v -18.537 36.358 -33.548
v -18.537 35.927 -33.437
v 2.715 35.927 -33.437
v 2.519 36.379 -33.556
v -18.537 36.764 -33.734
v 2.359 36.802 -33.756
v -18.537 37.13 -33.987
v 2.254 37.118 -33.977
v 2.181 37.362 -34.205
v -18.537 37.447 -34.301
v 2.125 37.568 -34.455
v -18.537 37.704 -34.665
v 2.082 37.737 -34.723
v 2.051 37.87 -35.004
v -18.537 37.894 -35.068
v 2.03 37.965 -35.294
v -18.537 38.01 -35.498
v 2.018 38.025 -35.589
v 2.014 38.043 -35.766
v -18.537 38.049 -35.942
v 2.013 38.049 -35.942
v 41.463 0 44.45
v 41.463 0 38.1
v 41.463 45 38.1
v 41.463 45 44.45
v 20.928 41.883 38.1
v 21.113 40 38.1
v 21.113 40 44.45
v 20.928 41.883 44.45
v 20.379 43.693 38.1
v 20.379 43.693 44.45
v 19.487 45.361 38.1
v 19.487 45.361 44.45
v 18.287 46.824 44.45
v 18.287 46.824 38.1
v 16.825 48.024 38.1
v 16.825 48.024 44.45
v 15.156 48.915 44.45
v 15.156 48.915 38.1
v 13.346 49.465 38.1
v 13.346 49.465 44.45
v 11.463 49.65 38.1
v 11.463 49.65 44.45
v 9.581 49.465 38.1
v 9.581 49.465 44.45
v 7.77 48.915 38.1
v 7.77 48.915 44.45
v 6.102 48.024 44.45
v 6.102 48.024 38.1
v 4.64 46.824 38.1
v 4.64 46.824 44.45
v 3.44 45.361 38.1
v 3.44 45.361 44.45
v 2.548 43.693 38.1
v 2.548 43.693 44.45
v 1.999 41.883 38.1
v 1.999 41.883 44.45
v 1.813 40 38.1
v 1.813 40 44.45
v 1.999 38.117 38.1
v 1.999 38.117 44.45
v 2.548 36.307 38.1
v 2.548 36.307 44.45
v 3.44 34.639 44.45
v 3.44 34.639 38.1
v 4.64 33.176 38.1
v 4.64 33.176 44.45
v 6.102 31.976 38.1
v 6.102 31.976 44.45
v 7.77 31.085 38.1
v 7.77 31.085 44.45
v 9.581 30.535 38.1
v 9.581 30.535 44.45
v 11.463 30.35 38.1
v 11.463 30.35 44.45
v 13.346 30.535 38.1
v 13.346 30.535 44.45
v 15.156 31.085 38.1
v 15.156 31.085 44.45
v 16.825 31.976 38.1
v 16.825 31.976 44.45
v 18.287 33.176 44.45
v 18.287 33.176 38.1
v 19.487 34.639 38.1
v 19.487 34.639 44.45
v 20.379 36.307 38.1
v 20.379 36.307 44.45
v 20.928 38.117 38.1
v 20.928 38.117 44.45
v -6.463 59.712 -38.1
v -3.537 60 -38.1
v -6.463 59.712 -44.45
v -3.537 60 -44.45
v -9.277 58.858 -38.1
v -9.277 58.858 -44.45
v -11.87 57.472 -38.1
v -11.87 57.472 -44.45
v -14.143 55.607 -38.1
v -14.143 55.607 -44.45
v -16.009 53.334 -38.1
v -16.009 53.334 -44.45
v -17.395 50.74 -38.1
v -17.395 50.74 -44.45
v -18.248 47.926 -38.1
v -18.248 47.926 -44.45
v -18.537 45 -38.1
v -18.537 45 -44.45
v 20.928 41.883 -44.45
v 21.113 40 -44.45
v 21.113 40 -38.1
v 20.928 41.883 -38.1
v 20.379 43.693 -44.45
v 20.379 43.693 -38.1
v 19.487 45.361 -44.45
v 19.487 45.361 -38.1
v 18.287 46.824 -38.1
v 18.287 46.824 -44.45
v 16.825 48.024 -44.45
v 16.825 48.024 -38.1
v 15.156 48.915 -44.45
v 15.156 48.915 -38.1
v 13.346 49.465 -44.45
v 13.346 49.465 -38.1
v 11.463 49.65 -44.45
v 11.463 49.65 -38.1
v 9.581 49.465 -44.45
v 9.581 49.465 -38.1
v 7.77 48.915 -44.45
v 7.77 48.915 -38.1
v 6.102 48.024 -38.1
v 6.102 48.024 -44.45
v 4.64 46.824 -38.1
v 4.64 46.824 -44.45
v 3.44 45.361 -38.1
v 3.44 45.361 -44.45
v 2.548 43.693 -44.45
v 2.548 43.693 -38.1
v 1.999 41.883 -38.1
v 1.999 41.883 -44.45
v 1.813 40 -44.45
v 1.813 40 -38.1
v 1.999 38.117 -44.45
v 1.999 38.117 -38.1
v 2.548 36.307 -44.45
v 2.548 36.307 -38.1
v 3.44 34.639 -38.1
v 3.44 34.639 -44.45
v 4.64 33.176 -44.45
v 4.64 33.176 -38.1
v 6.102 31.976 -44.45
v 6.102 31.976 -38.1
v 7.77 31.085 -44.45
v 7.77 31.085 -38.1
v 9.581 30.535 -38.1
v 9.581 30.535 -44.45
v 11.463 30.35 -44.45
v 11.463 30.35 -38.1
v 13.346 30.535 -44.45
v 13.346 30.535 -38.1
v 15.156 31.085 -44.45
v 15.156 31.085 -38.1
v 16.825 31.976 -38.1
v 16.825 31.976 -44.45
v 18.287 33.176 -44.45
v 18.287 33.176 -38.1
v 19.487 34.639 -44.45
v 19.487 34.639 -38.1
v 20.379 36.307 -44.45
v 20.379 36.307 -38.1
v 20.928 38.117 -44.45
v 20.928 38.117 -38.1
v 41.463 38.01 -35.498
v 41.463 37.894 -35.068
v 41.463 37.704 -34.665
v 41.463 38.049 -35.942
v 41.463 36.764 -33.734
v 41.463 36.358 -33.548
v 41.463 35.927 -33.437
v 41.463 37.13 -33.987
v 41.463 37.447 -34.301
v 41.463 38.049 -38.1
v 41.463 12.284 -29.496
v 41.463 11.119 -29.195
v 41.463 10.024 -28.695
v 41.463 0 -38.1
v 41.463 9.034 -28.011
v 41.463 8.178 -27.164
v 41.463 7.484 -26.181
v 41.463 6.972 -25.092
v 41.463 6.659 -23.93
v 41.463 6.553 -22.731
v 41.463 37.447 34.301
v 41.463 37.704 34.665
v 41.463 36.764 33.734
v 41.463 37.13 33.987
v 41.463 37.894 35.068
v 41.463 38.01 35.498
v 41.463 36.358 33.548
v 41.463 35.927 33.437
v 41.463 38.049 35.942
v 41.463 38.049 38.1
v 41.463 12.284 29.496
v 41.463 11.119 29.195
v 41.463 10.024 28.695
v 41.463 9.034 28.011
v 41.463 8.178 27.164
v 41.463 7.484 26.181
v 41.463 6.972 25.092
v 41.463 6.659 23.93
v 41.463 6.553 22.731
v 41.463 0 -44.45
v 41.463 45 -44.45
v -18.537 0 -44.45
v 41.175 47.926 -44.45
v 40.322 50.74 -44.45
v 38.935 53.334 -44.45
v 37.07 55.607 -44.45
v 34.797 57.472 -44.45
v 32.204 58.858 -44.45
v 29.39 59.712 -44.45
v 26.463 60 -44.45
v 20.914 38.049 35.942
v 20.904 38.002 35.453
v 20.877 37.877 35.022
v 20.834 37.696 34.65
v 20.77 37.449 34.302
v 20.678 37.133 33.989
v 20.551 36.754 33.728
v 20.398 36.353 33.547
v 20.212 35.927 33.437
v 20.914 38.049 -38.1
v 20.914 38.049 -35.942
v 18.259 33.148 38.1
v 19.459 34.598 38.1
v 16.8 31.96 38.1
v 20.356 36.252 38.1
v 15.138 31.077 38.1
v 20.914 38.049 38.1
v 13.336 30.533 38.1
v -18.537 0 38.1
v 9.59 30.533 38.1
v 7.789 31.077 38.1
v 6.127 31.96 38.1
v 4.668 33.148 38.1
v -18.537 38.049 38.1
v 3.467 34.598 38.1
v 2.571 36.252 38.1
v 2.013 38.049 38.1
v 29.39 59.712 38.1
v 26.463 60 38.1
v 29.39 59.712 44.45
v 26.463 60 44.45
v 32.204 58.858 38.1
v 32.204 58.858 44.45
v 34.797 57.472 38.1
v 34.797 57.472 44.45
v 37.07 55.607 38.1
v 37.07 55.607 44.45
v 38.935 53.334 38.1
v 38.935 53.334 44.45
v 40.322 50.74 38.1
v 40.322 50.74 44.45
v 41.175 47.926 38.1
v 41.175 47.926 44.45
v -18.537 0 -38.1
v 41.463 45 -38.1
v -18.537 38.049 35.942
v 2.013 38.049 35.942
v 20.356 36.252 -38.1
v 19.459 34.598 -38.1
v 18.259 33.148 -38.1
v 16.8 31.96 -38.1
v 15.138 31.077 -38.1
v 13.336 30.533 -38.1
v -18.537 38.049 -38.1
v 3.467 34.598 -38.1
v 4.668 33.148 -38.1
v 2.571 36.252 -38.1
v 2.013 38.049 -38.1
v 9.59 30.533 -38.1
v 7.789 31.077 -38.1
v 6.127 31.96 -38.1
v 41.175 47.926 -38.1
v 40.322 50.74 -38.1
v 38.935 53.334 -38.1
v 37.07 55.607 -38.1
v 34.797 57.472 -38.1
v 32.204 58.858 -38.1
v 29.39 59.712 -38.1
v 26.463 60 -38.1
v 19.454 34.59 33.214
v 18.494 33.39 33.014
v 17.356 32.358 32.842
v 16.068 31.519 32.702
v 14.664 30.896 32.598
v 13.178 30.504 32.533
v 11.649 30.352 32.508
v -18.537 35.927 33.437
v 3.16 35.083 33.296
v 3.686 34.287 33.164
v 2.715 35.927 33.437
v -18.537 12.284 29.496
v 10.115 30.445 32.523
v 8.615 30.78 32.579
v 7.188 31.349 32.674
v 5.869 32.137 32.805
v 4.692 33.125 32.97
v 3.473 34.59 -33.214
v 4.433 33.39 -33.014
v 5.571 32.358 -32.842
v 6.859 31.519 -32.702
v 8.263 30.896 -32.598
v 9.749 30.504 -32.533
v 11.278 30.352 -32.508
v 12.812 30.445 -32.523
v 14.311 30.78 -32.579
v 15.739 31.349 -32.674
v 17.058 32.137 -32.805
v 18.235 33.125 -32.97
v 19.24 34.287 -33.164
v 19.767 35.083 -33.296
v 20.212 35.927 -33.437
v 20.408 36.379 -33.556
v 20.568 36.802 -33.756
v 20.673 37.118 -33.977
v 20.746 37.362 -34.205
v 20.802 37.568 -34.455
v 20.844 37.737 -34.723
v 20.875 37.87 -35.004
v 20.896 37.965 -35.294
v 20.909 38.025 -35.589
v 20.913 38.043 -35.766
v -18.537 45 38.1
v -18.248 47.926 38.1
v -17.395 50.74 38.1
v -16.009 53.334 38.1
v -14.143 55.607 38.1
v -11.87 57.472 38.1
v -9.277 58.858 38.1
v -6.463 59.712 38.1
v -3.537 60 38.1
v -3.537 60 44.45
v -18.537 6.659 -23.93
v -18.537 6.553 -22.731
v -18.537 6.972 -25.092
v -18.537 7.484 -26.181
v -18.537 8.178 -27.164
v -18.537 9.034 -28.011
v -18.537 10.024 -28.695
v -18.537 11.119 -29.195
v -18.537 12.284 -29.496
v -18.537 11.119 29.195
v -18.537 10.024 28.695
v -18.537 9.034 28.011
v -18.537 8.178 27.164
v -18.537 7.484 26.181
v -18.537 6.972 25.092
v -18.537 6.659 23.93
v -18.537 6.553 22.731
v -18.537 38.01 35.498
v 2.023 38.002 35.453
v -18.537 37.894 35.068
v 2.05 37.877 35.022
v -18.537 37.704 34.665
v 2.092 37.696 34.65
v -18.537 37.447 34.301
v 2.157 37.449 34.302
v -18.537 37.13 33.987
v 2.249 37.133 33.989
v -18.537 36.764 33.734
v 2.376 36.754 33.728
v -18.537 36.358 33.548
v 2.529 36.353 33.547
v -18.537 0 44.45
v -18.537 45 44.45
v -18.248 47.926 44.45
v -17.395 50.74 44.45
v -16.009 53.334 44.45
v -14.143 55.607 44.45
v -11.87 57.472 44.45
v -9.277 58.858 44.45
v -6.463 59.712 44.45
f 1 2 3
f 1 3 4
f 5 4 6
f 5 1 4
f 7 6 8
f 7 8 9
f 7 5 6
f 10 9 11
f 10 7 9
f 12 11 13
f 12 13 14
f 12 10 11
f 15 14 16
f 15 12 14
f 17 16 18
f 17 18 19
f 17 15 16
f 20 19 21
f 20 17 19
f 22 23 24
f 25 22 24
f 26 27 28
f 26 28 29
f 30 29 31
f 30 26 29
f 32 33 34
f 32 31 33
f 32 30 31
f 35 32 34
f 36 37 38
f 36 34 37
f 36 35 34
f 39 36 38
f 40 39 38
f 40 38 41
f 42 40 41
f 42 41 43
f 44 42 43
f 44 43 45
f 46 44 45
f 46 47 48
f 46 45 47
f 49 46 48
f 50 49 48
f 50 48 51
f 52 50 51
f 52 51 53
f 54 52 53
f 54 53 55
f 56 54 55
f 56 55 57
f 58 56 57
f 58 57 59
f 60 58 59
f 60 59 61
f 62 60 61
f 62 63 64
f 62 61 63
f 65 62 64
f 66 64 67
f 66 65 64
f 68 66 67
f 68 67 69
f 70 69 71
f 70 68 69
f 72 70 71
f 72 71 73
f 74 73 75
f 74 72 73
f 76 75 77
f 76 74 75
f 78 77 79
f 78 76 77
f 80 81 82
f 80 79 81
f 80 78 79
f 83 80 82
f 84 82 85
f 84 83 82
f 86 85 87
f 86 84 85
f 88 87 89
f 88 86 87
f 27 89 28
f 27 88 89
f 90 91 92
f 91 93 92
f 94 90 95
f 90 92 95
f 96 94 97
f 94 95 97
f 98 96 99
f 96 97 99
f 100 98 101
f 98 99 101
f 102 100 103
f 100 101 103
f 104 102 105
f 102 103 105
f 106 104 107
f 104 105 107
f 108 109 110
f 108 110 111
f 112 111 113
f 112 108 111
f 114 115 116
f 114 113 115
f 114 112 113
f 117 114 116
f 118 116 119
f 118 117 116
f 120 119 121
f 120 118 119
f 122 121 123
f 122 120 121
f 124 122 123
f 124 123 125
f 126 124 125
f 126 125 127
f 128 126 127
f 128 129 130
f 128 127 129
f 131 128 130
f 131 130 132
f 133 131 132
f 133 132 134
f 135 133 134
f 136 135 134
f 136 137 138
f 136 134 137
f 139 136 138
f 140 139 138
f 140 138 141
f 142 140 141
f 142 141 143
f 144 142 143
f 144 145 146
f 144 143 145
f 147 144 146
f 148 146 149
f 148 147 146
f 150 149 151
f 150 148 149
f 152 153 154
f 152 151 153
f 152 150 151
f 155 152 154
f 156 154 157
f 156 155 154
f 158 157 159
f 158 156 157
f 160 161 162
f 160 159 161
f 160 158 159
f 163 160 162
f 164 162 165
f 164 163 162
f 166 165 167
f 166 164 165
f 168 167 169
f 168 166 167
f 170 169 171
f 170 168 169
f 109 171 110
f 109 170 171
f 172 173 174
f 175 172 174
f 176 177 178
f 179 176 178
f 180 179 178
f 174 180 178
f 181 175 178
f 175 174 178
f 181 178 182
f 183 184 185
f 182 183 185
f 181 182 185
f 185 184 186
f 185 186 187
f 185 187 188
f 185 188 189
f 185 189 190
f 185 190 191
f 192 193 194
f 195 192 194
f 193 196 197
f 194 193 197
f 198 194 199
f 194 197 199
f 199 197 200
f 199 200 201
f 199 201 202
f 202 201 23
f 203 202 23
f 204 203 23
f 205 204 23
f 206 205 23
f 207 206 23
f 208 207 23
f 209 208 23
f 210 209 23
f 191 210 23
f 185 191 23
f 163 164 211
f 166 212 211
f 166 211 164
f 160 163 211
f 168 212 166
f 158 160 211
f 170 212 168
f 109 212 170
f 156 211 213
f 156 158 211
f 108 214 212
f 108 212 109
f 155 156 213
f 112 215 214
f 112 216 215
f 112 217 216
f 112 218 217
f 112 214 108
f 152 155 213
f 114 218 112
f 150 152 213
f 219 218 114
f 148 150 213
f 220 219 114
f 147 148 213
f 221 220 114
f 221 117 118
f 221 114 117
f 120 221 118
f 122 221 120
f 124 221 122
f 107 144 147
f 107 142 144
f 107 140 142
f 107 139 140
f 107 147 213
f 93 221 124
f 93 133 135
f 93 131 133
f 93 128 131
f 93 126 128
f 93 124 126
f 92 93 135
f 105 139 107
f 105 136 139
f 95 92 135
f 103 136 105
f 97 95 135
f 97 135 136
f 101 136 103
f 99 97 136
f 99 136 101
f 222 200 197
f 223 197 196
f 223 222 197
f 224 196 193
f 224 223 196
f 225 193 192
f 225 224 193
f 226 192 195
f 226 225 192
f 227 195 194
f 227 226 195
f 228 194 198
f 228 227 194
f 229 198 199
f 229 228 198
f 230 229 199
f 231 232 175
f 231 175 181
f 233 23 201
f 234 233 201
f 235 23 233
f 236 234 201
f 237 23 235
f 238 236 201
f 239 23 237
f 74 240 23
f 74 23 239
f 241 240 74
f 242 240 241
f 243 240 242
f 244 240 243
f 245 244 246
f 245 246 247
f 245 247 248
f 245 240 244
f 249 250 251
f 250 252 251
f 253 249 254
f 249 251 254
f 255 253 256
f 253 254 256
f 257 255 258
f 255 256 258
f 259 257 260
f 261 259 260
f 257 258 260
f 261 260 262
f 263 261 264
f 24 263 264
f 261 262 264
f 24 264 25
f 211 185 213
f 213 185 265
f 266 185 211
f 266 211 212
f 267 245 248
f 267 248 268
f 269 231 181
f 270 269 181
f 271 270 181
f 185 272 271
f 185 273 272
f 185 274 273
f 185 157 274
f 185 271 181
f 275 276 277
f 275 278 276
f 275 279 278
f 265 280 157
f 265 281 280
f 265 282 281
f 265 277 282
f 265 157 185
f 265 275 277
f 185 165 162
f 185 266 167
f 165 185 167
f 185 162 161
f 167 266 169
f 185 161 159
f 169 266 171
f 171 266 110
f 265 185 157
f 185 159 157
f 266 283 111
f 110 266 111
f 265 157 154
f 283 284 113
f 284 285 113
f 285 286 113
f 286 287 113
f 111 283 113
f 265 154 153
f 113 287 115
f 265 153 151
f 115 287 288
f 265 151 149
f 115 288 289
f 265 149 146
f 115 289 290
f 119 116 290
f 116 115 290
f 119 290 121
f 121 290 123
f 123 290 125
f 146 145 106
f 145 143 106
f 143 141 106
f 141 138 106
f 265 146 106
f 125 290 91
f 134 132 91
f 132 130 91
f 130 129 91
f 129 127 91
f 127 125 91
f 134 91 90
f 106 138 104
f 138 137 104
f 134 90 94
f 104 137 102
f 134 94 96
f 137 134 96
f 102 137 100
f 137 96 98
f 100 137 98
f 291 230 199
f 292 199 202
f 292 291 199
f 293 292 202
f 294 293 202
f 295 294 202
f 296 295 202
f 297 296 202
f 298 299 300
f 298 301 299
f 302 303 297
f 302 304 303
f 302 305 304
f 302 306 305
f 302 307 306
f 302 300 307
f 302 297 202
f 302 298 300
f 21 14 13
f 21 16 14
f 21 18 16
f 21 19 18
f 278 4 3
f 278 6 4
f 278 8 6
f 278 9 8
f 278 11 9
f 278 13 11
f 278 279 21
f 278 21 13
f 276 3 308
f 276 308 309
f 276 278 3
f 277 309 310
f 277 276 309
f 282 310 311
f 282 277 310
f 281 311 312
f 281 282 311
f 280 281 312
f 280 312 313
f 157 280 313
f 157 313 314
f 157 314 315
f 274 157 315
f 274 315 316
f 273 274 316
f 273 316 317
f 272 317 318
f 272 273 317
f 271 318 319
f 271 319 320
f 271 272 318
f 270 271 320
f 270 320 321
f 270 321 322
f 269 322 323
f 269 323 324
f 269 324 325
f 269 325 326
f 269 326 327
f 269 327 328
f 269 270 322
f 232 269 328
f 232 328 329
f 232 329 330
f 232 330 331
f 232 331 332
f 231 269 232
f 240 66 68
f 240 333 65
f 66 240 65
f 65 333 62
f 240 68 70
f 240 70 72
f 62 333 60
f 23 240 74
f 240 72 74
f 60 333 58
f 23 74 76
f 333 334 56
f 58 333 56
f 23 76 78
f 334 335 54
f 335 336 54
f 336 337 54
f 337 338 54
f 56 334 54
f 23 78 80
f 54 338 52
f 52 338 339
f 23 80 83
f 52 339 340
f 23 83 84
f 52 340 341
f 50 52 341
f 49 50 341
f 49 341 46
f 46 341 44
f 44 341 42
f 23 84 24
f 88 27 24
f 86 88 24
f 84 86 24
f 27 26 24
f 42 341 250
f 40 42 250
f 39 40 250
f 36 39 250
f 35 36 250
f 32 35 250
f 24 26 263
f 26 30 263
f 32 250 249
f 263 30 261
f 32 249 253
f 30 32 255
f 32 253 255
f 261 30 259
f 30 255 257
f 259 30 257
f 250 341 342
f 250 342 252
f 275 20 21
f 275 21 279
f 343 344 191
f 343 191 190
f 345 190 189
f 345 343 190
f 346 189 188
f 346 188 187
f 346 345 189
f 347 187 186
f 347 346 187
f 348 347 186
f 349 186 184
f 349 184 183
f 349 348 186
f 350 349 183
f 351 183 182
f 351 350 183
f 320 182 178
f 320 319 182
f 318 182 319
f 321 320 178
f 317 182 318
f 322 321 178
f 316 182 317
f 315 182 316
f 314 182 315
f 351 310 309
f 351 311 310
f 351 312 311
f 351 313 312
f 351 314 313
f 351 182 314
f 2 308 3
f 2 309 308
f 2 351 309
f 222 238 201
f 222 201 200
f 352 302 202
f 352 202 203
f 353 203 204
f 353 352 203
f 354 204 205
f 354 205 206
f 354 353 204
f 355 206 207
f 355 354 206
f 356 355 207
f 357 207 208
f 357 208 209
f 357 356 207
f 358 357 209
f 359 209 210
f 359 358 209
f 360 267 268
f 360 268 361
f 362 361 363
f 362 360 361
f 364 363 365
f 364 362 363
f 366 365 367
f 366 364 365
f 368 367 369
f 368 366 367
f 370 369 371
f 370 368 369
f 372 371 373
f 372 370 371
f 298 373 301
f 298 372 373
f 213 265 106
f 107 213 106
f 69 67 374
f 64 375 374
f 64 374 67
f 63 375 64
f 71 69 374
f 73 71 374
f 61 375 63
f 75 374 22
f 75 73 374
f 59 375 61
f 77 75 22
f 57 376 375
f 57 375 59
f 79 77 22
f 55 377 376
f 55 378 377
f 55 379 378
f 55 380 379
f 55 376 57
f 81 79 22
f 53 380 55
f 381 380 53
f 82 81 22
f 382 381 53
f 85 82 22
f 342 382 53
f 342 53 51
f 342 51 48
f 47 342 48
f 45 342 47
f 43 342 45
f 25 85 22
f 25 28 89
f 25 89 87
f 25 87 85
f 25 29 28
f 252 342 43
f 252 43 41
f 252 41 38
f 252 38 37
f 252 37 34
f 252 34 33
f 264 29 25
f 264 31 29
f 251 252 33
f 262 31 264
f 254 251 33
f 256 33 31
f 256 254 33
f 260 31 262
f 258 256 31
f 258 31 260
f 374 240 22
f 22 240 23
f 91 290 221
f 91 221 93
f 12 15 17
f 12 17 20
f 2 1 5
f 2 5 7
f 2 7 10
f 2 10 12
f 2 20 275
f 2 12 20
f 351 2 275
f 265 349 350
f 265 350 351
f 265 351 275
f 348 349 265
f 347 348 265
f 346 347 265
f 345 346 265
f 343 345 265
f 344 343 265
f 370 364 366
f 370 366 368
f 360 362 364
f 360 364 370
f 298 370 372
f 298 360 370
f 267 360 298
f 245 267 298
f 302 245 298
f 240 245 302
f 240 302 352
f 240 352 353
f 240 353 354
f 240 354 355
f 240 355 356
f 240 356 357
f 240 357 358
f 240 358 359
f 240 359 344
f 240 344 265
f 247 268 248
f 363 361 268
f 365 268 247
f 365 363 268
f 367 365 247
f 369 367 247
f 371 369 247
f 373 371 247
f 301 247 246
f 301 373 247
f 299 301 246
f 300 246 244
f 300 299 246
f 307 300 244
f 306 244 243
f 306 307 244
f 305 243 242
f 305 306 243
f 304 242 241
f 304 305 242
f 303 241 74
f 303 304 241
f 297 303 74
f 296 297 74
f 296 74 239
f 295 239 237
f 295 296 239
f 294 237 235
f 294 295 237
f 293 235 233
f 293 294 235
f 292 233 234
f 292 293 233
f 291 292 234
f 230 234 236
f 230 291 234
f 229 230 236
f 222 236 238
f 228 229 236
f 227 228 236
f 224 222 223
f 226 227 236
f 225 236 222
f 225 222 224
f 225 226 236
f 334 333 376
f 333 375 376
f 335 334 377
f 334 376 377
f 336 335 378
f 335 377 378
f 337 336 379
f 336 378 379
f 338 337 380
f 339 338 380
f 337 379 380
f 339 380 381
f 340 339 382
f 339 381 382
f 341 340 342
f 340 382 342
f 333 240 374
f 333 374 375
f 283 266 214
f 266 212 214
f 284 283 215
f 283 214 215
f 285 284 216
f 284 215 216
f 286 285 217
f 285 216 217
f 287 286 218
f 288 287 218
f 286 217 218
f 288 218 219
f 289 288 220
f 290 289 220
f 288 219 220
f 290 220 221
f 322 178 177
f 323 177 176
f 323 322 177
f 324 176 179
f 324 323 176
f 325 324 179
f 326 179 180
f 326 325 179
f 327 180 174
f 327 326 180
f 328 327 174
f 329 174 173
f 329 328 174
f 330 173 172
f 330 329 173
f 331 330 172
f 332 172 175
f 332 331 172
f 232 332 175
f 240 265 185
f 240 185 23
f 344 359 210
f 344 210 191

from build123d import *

# Parameters (mm, degrees)
MIEMBRO_ESTRUCTURAL1_DEPTH = 60
CROQUIS20_W                = 60
CROQUIS20_H                = 60
BRIDA_BASE2_DEPTH          = 6.35
CROQUIS19_W                = 60
CROQUIS19_H                = 60
BRIDA_BASE3_DEPTH          = 6.35
CORTAR_EXTRUIR1_DEPTH      = 111.153127737
CORTAR_EXTRUIR1_DEPTH_BACK = 111.153127737
CROQUIS4_R                 = 9.65
REDONDEO1_R                = 15
REDONDEO2_R                = 15


# Sheet-metal steps are written as plain solids
with BuildPart() as part:
    # Sketch1 → Miembro estructural1 (new body)
    with BuildSketch(Plane.YZ.offset(-18.536654135)):
        with BuildLine():
            Line((0, -38.1), (0, 38.1))
            Line((0, 38.1), (38.0492, 38.1))
            Line((38.0492, 38.1), (38.0492, 35.942335136))
            ThreePointArc((38.0492, 35.942335136), (37.447280466, 34.300554363), (35.926803066, 33.436899509))
            Line((35.926803066, 33.436899509), (12.283671721, 29.496090157))
            ThreePointArc((12.283671721, 29.496090157), (8.178382741, 27.164222052), (6.5532, 22.731413966))
            Line((6.5532, 22.731413966), (6.5532, -22.731413966))
            ThreePointArc((6.5532, -22.731413966), (8.178382741, -27.164222052), (12.283671721, -29.496090157))
            Line((12.283671721, -29.496090157), (35.926803066, -33.436899509))
            ThreePointArc((35.926803066, -33.436899509), (37.447280466, -34.300554363), (38.0492, -35.942335136))
            Line((38.0492, -35.942335136), (38.0492, -38.1))
            Line((38.0492, -38.1), (0, -38.1))
        make_face()
    extrude(amount=MIEMBRO_ESTRUCTURAL1_DEPTH)


with BuildPart() as body_2:
    # Croquis20 → Brida base2 (new body)
    with BuildSketch(Plane(origin=(0, 0, -38.1), x_dir=(-1, 0, 0), z_dir=(0, 0, -1))):
        with Locations((-11.463345865, 30)):
            Rectangle(CROQUIS20_W, CROQUIS20_H)
    extrude(amount=BRIDA_BASE2_DEPTH)


with BuildPart() as body_3:
    # Croquis19 → Brida base3 (new body)
    with BuildSketch(Plane.XY.offset(38.1)):
        with Locations((11.463345865, 30)):
            Rectangle(CROQUIS19_W, CROQUIS19_H)
    extrude(amount=BRIDA_BASE3_DEPTH)


with BuildPart() as cortar_extruir1_tool:
    # Croquis4 → Cortar-Extruir1 (new, two sides: drawn at the far end of the back side and taken through both)
    with BuildSketch(Plane.XY.offset(38.1).offset(-CORTAR_EXTRUIR1_DEPTH_BACK)):
        with Locations((11.463345865, 40)):
            Circle(CROQUIS4_R)
    extrude(amount=CORTAR_EXTRUIR1_DEPTH + CORTAR_EXTRUIR1_DEPTH_BACK)


with BuildPart() as part_1:
    add(part.part)

    # Cortar-Extruir1: cut by cortar_extruir1_tool
    add(cortar_extruir1_tool.part, mode=Mode.SUBTRACT)


with BuildPart() as body_2_1:
    add(body_2.part)

    # Cortar-Extruir1: cut by cortar_extruir1_tool
    add(cortar_extruir1_tool.part, mode=Mode.SUBTRACT)

    # Redondeo1
    redondeo1_edges = [body_2_1.edges().sort_by_distance(p)[0] for p in [
        (41.463345865, 60, -41.275),
        (-18.536654135, 60, -41.275),
    ]]
    fillet(redondeo1_edges, radius=REDONDEO1_R)


with BuildPart() as body_3_1:
    add(body_3.part)

    # Cortar-Extruir1: cut by cortar_extruir1_tool
    add(cortar_extruir1_tool.part, mode=Mode.SUBTRACT)

    # Redondeo2
    redondeo2_edges = [body_3_1.edges().sort_by_distance(p)[0] for p in [
        (-18.536654135, 60, 41.275),
        (41.463345865, 60, 41.275),
    ]]
    fillet(redondeo2_edges, radius=REDONDEO2_R)


solid = Compound([part_1.part, body_2_1.part, body_3_1.part])
